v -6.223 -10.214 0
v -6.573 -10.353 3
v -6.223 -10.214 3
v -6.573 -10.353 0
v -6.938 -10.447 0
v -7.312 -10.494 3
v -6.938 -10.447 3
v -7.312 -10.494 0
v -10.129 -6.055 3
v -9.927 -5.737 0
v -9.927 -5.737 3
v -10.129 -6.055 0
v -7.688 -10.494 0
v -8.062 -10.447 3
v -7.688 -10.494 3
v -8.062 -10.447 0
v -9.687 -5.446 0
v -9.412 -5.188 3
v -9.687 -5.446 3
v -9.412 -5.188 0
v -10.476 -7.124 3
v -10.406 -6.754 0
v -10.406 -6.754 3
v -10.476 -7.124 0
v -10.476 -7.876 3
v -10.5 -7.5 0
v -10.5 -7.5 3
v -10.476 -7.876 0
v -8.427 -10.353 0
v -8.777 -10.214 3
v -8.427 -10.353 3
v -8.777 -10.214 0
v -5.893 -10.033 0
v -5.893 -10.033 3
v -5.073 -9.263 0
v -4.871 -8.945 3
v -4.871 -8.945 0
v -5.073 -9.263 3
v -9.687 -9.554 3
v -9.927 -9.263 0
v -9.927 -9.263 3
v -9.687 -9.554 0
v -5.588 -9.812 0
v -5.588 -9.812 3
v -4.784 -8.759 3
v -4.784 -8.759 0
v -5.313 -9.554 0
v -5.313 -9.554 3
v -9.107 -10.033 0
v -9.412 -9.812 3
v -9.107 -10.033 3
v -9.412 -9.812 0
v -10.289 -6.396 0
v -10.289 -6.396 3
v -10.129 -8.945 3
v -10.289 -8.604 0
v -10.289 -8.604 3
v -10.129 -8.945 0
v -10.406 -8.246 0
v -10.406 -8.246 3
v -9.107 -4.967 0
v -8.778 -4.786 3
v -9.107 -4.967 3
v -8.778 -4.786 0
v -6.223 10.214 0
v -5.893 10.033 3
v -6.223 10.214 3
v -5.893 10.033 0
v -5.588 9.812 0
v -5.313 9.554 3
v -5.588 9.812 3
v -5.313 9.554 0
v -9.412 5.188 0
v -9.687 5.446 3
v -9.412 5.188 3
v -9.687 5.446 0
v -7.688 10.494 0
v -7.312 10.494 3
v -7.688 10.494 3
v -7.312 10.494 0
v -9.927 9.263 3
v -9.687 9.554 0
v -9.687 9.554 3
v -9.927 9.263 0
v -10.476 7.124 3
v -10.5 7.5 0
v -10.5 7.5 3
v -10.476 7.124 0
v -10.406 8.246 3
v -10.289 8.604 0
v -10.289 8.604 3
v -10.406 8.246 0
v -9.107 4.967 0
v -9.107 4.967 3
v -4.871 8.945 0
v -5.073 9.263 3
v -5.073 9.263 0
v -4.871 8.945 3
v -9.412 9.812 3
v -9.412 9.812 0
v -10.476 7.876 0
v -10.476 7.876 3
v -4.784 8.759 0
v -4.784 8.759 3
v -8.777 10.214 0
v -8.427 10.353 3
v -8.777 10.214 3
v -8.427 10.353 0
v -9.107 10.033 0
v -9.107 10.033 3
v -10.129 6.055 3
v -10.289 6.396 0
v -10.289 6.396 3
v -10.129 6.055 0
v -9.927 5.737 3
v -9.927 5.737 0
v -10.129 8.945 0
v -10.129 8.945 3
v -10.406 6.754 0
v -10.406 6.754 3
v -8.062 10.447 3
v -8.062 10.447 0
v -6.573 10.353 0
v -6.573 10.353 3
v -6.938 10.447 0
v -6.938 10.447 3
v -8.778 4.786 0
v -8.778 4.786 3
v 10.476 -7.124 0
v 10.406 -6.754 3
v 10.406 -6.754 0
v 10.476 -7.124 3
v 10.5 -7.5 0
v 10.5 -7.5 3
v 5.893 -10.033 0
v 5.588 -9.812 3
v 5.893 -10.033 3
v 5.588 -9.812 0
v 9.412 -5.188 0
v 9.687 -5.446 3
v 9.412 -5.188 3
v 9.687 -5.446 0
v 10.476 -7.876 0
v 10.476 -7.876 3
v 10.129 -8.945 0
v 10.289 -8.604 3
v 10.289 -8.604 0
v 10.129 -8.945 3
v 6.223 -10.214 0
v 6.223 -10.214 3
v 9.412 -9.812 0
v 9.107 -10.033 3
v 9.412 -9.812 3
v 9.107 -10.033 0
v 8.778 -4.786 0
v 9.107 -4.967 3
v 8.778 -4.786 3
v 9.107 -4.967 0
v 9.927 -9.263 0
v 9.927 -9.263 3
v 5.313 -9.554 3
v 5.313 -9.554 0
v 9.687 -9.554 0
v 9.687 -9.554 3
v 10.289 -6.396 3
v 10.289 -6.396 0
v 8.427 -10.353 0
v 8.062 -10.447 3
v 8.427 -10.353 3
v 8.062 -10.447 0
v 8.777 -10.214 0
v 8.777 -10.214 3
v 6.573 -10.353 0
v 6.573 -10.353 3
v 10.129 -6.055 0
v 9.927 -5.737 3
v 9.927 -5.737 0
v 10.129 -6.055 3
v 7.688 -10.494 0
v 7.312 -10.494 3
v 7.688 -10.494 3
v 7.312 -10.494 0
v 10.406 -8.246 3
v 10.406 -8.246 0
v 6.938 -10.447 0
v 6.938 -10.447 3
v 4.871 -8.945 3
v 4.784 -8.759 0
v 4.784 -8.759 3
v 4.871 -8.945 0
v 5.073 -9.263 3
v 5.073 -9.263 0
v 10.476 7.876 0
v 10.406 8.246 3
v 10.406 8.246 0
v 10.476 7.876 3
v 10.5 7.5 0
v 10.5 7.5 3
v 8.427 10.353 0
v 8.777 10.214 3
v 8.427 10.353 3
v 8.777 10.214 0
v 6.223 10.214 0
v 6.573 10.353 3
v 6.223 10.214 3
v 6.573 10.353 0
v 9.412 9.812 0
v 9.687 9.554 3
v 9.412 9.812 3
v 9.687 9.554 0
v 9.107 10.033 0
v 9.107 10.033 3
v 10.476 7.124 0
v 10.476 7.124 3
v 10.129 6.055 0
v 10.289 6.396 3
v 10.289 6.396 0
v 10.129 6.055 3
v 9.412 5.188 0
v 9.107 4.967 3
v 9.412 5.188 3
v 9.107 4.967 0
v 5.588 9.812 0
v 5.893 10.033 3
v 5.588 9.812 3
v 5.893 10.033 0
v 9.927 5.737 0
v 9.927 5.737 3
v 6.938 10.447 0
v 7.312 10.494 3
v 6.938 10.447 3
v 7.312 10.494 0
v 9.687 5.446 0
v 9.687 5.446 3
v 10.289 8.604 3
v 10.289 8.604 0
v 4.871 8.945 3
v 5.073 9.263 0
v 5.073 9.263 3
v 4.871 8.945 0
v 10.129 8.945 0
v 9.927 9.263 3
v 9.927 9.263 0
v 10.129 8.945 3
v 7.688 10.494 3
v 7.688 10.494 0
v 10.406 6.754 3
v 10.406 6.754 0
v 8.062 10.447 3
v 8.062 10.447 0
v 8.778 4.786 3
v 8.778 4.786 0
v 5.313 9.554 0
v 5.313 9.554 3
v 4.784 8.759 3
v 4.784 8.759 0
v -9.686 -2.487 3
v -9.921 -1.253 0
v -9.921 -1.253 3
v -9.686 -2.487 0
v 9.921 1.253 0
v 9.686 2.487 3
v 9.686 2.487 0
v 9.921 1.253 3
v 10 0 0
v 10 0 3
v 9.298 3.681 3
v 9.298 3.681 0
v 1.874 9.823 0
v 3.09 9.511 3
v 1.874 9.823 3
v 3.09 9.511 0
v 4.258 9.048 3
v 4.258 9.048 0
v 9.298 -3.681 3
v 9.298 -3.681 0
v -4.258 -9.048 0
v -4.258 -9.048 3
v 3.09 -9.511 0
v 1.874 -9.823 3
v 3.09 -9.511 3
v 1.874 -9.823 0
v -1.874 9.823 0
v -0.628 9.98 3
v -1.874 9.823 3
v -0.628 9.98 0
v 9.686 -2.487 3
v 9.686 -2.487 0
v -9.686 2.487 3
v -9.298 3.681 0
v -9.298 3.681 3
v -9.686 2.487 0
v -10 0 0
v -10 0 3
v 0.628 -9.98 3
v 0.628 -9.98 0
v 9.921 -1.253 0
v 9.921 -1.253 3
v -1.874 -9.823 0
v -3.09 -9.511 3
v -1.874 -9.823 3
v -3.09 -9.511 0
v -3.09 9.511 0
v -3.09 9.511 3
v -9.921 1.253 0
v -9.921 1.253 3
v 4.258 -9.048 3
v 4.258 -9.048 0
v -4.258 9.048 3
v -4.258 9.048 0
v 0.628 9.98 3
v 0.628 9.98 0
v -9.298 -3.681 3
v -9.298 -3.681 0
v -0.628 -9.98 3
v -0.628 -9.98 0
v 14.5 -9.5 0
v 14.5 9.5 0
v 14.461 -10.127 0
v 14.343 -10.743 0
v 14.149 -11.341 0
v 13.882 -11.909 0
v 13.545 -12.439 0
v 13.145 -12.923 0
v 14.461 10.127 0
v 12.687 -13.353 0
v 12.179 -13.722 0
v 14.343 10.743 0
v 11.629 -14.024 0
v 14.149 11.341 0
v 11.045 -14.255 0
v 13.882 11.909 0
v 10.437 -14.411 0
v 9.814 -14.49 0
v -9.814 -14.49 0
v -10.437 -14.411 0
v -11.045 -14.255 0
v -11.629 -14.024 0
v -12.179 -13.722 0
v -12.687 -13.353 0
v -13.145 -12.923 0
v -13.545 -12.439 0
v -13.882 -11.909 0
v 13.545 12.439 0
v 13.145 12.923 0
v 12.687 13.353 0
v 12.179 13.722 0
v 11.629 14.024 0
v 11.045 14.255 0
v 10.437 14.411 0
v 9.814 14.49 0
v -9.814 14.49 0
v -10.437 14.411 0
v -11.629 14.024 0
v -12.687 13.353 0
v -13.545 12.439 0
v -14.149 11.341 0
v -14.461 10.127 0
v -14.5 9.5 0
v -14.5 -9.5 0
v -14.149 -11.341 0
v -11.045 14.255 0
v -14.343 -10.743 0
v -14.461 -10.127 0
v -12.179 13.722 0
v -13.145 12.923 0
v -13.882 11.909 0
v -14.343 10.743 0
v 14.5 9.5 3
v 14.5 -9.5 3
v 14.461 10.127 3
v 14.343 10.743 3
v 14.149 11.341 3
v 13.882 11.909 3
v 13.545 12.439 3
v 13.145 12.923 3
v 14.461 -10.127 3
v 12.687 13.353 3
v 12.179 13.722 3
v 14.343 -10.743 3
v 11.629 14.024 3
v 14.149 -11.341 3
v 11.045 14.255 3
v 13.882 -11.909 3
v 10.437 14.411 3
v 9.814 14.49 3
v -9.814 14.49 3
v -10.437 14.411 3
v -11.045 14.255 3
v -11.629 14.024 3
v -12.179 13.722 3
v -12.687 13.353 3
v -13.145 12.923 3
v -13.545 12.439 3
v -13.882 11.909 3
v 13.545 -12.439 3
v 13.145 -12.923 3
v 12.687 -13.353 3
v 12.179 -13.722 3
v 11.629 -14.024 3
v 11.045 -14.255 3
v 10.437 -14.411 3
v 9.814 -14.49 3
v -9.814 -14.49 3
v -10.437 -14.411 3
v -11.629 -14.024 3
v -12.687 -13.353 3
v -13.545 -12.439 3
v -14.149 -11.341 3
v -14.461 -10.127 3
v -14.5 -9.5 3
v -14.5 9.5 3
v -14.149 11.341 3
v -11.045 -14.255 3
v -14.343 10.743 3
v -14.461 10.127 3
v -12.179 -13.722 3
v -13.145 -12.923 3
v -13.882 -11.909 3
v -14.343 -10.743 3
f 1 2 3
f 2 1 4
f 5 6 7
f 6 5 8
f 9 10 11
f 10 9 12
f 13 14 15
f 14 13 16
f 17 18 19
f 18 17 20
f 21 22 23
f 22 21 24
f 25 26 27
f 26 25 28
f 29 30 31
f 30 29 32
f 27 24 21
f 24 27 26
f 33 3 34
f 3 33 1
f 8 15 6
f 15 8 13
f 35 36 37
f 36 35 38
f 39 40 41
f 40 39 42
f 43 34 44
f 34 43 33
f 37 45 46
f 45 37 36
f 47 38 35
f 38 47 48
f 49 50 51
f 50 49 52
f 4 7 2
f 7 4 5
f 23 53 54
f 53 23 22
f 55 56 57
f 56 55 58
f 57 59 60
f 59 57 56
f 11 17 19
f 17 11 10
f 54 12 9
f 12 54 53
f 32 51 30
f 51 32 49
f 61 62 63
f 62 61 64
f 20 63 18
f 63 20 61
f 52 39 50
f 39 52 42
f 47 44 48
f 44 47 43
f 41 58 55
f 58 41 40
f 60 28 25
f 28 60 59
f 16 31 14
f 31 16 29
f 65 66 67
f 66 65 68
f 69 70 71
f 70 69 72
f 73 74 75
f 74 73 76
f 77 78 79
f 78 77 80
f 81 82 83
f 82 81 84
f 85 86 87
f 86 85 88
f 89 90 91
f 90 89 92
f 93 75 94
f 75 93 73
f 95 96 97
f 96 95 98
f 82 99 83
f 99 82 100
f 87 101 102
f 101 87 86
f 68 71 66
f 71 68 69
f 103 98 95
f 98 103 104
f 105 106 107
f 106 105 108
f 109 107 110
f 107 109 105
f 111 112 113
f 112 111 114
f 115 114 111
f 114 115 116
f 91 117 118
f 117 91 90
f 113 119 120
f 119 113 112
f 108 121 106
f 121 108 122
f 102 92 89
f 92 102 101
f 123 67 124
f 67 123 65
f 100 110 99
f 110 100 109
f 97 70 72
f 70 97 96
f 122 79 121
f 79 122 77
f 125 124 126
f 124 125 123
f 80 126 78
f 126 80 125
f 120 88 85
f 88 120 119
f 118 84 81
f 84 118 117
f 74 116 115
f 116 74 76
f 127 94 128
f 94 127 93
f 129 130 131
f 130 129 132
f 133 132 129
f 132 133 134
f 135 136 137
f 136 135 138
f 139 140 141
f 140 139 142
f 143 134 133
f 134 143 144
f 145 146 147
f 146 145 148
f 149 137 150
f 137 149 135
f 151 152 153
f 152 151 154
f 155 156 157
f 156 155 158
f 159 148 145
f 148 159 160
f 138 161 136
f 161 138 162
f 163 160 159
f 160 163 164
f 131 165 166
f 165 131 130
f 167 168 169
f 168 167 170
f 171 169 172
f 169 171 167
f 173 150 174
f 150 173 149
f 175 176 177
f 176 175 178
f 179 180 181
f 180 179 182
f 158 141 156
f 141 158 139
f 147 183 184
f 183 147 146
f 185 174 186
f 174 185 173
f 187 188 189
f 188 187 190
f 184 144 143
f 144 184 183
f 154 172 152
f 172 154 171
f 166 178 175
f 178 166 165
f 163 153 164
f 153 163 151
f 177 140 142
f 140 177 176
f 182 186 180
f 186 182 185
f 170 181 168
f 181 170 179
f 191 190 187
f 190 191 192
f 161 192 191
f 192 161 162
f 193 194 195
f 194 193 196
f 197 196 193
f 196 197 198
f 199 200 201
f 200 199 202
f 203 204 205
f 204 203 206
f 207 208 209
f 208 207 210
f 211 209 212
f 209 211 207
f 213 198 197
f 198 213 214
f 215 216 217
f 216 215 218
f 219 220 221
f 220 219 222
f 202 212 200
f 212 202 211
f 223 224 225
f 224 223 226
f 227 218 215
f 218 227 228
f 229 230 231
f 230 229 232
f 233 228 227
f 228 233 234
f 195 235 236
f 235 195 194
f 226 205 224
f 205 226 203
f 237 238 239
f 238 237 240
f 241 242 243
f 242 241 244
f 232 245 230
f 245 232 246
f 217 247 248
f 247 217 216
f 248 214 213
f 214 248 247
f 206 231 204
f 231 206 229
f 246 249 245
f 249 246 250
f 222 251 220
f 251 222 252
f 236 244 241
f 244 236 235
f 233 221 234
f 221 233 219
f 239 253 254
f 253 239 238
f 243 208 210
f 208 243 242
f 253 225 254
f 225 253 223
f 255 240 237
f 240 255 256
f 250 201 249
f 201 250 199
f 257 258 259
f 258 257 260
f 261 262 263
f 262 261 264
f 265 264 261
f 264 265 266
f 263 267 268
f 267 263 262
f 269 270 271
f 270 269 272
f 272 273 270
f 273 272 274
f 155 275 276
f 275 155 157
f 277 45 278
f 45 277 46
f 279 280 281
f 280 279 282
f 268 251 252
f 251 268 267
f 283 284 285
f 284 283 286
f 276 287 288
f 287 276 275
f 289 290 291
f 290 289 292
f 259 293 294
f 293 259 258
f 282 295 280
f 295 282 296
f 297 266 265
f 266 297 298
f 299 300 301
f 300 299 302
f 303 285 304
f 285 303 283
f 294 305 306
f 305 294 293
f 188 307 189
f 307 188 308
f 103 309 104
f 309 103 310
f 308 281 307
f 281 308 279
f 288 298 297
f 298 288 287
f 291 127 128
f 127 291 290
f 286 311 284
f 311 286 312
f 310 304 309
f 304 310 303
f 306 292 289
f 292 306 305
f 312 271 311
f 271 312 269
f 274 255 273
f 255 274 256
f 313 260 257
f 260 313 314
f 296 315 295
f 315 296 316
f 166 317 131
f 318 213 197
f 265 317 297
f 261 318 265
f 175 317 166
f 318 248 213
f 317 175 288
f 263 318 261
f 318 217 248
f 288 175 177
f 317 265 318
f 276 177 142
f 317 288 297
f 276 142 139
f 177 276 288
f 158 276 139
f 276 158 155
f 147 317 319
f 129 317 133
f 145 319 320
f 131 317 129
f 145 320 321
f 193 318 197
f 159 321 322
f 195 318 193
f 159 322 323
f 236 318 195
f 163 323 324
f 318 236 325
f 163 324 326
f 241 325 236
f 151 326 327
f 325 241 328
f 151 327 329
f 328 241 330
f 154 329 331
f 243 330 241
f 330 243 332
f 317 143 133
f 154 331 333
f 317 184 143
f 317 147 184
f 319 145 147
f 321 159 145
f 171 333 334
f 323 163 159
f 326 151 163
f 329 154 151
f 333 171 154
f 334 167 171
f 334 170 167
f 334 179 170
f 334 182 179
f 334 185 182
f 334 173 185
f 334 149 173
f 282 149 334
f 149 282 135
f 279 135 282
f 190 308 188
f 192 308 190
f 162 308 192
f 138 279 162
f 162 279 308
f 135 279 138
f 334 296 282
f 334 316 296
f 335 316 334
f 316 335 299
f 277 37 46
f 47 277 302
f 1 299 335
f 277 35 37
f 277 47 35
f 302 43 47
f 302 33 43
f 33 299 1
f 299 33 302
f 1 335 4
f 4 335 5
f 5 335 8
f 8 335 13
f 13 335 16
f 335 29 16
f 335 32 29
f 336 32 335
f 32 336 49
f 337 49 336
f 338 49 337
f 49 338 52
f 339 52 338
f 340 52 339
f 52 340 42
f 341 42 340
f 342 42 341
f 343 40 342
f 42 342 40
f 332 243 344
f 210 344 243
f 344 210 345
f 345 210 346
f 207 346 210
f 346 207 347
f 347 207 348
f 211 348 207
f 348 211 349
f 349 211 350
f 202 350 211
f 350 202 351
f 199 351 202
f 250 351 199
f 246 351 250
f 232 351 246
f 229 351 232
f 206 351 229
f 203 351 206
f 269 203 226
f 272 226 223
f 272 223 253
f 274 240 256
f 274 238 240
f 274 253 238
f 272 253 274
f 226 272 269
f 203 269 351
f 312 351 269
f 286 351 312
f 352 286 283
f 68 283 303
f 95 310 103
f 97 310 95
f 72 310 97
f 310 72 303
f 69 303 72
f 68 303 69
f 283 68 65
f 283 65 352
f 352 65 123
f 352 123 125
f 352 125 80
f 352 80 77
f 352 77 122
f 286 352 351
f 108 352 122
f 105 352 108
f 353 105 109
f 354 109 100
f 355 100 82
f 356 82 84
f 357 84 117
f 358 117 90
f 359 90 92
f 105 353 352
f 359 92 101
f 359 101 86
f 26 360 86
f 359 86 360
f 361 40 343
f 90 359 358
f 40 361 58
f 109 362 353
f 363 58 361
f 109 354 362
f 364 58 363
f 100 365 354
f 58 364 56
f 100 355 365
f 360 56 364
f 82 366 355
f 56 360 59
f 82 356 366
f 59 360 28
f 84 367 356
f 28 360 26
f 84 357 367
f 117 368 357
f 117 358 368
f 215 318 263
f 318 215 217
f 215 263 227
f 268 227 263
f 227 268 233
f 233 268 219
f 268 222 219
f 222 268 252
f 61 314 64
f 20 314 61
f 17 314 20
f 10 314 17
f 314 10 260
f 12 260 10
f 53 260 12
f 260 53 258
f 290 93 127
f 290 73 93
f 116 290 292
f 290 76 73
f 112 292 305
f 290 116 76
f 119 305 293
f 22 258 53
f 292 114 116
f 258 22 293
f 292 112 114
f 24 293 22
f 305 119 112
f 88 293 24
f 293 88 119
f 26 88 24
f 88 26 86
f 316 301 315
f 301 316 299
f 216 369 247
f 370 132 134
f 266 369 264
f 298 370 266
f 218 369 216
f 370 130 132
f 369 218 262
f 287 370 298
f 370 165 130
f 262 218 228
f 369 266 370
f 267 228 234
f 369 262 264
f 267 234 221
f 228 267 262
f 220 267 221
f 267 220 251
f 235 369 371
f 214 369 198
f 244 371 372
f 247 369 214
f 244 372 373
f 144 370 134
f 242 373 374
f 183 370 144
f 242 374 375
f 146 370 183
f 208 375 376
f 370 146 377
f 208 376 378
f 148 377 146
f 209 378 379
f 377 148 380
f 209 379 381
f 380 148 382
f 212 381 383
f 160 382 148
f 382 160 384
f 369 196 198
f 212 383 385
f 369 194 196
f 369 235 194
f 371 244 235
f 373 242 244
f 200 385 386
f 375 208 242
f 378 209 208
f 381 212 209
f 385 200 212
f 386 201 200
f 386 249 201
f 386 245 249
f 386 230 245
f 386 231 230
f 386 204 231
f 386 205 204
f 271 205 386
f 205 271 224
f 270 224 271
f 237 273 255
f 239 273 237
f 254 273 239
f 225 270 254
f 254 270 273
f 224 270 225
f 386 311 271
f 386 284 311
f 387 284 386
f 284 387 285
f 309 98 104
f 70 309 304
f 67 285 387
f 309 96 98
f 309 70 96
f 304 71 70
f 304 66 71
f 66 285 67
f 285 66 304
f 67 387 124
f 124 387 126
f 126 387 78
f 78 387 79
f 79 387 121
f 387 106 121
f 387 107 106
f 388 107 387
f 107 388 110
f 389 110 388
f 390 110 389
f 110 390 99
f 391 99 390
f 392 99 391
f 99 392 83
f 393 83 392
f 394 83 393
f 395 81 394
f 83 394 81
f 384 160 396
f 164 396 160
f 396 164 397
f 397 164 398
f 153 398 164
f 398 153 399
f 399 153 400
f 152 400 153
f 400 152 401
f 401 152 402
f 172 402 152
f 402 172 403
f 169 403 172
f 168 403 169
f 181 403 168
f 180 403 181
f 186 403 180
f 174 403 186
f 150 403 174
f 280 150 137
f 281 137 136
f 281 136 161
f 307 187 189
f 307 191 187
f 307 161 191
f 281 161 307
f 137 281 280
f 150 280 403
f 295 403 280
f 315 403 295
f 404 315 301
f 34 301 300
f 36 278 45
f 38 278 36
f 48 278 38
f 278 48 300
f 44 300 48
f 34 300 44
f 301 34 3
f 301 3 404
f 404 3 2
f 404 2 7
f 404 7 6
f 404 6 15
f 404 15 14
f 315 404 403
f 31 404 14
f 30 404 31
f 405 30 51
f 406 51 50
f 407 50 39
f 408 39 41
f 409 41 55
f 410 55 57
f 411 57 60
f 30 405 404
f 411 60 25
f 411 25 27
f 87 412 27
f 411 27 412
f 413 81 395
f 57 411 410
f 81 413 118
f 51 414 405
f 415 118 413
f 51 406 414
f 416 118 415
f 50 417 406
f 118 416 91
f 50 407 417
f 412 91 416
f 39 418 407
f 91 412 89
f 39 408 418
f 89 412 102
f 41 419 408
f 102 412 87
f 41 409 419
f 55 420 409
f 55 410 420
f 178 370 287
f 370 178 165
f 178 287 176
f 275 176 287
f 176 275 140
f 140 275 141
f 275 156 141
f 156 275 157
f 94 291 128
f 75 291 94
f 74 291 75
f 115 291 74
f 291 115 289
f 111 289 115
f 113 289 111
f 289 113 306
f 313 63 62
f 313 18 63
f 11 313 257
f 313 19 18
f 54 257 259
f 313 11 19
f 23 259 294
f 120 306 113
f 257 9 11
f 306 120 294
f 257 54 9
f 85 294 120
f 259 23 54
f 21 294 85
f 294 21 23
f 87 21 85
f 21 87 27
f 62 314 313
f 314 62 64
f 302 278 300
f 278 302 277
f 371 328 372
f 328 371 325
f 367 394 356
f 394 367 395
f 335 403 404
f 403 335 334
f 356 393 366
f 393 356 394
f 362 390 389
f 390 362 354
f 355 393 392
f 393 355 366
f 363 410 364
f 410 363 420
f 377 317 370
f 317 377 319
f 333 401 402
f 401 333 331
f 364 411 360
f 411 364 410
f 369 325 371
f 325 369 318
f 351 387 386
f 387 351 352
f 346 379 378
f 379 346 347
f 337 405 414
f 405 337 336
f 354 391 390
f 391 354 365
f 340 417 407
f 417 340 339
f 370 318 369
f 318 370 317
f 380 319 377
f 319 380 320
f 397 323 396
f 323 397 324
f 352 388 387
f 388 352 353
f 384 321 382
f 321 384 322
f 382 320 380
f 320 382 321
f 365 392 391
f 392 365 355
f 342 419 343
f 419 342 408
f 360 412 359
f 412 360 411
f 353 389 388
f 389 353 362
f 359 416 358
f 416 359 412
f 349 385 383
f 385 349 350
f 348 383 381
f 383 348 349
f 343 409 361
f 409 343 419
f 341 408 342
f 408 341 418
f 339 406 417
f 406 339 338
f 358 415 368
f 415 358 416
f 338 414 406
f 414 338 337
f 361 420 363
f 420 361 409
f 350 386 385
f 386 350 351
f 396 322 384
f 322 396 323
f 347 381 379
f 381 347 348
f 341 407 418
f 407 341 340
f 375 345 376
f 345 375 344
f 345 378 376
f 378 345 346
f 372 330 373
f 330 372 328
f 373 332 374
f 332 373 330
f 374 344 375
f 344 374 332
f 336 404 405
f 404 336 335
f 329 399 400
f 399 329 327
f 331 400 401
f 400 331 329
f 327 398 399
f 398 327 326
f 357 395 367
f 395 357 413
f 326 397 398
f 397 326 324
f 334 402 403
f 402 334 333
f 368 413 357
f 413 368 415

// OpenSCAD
$fn = 50;


difference() {
	union() {
		hull() {
			translate(v = [-9.5000000000, 9.5000000000, 0]) {
				cylinder(h = 3, r = 5);
			}
			translate(v = [9.5000000000, 9.5000000000, 0]) {
				cylinder(h = 3, r = 5);
			}
			translate(v = [-9.5000000000, -9.5000000000, 0]) {
				cylinder(h = 3, r = 5);
			}
			translate(v = [9.5000000000, -9.5000000000, 0]) {
				cylinder(h = 3, r = 5);
			}
		}
	}
	union() {
		#translate(v = [-7.5000000000, -7.5000000000, -100.0000000000]) {
			cylinder(h = 200, r = 3.0000000000);
		}
		#translate(v = [-7.5000000000, 7.5000000000, -100.0000000000]) {
			cylinder(h = 200, r = 3.0000000000);
		}
		#translate(v = [7.5000000000, -7.5000000000, -100.0000000000]) {
			cylinder(h = 200, r = 3.0000000000);
		}
		#translate(v = [7.5000000000, 7.5000000000, -100.0000000000]) {
			cylinder(h = 200, r = 3.0000000000);
		}
		#cylinder(h = 3, r = 10.0000000000);
	}
}
